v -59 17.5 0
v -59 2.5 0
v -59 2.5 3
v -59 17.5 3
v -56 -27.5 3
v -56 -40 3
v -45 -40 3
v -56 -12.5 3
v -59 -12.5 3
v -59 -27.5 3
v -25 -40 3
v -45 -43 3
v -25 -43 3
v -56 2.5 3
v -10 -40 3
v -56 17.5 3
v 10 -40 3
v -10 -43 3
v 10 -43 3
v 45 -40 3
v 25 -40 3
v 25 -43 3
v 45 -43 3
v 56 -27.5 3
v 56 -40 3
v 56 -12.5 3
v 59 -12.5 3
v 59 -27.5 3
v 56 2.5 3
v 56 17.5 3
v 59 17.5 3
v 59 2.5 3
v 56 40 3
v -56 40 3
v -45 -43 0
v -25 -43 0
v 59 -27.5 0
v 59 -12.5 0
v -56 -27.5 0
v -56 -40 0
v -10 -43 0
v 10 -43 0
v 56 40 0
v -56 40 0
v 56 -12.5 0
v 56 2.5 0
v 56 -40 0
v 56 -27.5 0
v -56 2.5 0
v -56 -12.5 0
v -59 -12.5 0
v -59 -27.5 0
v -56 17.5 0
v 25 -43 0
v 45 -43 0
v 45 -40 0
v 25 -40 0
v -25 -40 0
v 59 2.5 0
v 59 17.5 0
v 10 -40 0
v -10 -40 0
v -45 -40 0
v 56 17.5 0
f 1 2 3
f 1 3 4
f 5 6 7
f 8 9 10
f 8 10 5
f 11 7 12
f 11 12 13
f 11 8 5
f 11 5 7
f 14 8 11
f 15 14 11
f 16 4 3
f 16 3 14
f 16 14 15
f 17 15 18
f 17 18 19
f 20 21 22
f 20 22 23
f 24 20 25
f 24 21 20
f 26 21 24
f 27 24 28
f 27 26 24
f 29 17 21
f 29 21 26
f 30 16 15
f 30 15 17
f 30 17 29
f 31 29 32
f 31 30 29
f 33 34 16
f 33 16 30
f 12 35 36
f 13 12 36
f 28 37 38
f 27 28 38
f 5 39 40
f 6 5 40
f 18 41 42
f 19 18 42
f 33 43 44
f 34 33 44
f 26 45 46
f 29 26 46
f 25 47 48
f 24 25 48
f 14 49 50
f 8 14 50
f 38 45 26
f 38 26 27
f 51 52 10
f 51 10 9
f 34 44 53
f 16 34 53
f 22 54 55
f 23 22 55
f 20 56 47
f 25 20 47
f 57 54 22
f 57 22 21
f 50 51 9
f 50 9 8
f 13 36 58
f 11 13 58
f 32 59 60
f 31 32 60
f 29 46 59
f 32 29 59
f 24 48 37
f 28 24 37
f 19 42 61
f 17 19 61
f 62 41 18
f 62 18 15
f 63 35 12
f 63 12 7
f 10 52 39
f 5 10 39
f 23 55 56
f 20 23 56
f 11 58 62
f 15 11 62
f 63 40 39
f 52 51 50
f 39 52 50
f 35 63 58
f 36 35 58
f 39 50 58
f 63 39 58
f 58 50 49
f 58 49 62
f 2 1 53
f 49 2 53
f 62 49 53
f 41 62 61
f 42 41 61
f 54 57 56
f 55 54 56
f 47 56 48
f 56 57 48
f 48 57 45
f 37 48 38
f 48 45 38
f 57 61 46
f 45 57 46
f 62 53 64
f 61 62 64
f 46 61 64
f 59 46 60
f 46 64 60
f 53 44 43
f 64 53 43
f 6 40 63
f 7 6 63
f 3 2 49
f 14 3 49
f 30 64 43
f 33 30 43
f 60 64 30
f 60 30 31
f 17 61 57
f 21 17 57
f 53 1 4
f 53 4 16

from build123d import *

# Parameters (mm, degrees)
SKETCH2_W           = 20
SKETCH2_H           = 3
SKETCH2_W_2         = 3
SKETCH2_H_2         = 15
BOSS_EXTRUDE1_DEPTH = 3


with BuildPart() as part:
    # Sketch2 → Boss-Extrude1 (new body)
    with BuildSketch(Plane.XY):
        Polygon((45, -40), (56, -40), (56, -27.5), (56, -12.5), (56, 2.5), (-56, 2.5), (-56, -12.5), (-56, -27.5), (-56, -40), (-45, -40), (-25, -40), (-10, -40), (10, -40), (25, -40), align=None)
        with Locations((35, -41.5)):
            Rectangle(SKETCH2_W, SKETCH2_H)
        with Locations((57.5, -20)):
            Rectangle(SKETCH2_W_2, SKETCH2_H_2)
        with Locations((0, -41.5)):
            Rectangle(SKETCH2_W, SKETCH2_H)
        Polygon((-56, 2.5), (56, 2.5), (56, 17.5), (56, 40), (-56, 40), (-56, 17.5), align=None)
        with Locations((57.5, 10)):
            Rectangle(SKETCH2_W_2, SKETCH2_H_2)
        with Locations((-57.5, 10)):
            Rectangle(SKETCH2_W_2, SKETCH2_H_2)
        with Locations((-35, -41.5)):
            Rectangle(SKETCH2_W, SKETCH2_H)
        with Locations((-57.5, -20)):
            Rectangle(SKETCH2_W_2, SKETCH2_H_2)
    extrude(amount=BOSS_EXTRUDE1_DEPTH)


solid = part.part
